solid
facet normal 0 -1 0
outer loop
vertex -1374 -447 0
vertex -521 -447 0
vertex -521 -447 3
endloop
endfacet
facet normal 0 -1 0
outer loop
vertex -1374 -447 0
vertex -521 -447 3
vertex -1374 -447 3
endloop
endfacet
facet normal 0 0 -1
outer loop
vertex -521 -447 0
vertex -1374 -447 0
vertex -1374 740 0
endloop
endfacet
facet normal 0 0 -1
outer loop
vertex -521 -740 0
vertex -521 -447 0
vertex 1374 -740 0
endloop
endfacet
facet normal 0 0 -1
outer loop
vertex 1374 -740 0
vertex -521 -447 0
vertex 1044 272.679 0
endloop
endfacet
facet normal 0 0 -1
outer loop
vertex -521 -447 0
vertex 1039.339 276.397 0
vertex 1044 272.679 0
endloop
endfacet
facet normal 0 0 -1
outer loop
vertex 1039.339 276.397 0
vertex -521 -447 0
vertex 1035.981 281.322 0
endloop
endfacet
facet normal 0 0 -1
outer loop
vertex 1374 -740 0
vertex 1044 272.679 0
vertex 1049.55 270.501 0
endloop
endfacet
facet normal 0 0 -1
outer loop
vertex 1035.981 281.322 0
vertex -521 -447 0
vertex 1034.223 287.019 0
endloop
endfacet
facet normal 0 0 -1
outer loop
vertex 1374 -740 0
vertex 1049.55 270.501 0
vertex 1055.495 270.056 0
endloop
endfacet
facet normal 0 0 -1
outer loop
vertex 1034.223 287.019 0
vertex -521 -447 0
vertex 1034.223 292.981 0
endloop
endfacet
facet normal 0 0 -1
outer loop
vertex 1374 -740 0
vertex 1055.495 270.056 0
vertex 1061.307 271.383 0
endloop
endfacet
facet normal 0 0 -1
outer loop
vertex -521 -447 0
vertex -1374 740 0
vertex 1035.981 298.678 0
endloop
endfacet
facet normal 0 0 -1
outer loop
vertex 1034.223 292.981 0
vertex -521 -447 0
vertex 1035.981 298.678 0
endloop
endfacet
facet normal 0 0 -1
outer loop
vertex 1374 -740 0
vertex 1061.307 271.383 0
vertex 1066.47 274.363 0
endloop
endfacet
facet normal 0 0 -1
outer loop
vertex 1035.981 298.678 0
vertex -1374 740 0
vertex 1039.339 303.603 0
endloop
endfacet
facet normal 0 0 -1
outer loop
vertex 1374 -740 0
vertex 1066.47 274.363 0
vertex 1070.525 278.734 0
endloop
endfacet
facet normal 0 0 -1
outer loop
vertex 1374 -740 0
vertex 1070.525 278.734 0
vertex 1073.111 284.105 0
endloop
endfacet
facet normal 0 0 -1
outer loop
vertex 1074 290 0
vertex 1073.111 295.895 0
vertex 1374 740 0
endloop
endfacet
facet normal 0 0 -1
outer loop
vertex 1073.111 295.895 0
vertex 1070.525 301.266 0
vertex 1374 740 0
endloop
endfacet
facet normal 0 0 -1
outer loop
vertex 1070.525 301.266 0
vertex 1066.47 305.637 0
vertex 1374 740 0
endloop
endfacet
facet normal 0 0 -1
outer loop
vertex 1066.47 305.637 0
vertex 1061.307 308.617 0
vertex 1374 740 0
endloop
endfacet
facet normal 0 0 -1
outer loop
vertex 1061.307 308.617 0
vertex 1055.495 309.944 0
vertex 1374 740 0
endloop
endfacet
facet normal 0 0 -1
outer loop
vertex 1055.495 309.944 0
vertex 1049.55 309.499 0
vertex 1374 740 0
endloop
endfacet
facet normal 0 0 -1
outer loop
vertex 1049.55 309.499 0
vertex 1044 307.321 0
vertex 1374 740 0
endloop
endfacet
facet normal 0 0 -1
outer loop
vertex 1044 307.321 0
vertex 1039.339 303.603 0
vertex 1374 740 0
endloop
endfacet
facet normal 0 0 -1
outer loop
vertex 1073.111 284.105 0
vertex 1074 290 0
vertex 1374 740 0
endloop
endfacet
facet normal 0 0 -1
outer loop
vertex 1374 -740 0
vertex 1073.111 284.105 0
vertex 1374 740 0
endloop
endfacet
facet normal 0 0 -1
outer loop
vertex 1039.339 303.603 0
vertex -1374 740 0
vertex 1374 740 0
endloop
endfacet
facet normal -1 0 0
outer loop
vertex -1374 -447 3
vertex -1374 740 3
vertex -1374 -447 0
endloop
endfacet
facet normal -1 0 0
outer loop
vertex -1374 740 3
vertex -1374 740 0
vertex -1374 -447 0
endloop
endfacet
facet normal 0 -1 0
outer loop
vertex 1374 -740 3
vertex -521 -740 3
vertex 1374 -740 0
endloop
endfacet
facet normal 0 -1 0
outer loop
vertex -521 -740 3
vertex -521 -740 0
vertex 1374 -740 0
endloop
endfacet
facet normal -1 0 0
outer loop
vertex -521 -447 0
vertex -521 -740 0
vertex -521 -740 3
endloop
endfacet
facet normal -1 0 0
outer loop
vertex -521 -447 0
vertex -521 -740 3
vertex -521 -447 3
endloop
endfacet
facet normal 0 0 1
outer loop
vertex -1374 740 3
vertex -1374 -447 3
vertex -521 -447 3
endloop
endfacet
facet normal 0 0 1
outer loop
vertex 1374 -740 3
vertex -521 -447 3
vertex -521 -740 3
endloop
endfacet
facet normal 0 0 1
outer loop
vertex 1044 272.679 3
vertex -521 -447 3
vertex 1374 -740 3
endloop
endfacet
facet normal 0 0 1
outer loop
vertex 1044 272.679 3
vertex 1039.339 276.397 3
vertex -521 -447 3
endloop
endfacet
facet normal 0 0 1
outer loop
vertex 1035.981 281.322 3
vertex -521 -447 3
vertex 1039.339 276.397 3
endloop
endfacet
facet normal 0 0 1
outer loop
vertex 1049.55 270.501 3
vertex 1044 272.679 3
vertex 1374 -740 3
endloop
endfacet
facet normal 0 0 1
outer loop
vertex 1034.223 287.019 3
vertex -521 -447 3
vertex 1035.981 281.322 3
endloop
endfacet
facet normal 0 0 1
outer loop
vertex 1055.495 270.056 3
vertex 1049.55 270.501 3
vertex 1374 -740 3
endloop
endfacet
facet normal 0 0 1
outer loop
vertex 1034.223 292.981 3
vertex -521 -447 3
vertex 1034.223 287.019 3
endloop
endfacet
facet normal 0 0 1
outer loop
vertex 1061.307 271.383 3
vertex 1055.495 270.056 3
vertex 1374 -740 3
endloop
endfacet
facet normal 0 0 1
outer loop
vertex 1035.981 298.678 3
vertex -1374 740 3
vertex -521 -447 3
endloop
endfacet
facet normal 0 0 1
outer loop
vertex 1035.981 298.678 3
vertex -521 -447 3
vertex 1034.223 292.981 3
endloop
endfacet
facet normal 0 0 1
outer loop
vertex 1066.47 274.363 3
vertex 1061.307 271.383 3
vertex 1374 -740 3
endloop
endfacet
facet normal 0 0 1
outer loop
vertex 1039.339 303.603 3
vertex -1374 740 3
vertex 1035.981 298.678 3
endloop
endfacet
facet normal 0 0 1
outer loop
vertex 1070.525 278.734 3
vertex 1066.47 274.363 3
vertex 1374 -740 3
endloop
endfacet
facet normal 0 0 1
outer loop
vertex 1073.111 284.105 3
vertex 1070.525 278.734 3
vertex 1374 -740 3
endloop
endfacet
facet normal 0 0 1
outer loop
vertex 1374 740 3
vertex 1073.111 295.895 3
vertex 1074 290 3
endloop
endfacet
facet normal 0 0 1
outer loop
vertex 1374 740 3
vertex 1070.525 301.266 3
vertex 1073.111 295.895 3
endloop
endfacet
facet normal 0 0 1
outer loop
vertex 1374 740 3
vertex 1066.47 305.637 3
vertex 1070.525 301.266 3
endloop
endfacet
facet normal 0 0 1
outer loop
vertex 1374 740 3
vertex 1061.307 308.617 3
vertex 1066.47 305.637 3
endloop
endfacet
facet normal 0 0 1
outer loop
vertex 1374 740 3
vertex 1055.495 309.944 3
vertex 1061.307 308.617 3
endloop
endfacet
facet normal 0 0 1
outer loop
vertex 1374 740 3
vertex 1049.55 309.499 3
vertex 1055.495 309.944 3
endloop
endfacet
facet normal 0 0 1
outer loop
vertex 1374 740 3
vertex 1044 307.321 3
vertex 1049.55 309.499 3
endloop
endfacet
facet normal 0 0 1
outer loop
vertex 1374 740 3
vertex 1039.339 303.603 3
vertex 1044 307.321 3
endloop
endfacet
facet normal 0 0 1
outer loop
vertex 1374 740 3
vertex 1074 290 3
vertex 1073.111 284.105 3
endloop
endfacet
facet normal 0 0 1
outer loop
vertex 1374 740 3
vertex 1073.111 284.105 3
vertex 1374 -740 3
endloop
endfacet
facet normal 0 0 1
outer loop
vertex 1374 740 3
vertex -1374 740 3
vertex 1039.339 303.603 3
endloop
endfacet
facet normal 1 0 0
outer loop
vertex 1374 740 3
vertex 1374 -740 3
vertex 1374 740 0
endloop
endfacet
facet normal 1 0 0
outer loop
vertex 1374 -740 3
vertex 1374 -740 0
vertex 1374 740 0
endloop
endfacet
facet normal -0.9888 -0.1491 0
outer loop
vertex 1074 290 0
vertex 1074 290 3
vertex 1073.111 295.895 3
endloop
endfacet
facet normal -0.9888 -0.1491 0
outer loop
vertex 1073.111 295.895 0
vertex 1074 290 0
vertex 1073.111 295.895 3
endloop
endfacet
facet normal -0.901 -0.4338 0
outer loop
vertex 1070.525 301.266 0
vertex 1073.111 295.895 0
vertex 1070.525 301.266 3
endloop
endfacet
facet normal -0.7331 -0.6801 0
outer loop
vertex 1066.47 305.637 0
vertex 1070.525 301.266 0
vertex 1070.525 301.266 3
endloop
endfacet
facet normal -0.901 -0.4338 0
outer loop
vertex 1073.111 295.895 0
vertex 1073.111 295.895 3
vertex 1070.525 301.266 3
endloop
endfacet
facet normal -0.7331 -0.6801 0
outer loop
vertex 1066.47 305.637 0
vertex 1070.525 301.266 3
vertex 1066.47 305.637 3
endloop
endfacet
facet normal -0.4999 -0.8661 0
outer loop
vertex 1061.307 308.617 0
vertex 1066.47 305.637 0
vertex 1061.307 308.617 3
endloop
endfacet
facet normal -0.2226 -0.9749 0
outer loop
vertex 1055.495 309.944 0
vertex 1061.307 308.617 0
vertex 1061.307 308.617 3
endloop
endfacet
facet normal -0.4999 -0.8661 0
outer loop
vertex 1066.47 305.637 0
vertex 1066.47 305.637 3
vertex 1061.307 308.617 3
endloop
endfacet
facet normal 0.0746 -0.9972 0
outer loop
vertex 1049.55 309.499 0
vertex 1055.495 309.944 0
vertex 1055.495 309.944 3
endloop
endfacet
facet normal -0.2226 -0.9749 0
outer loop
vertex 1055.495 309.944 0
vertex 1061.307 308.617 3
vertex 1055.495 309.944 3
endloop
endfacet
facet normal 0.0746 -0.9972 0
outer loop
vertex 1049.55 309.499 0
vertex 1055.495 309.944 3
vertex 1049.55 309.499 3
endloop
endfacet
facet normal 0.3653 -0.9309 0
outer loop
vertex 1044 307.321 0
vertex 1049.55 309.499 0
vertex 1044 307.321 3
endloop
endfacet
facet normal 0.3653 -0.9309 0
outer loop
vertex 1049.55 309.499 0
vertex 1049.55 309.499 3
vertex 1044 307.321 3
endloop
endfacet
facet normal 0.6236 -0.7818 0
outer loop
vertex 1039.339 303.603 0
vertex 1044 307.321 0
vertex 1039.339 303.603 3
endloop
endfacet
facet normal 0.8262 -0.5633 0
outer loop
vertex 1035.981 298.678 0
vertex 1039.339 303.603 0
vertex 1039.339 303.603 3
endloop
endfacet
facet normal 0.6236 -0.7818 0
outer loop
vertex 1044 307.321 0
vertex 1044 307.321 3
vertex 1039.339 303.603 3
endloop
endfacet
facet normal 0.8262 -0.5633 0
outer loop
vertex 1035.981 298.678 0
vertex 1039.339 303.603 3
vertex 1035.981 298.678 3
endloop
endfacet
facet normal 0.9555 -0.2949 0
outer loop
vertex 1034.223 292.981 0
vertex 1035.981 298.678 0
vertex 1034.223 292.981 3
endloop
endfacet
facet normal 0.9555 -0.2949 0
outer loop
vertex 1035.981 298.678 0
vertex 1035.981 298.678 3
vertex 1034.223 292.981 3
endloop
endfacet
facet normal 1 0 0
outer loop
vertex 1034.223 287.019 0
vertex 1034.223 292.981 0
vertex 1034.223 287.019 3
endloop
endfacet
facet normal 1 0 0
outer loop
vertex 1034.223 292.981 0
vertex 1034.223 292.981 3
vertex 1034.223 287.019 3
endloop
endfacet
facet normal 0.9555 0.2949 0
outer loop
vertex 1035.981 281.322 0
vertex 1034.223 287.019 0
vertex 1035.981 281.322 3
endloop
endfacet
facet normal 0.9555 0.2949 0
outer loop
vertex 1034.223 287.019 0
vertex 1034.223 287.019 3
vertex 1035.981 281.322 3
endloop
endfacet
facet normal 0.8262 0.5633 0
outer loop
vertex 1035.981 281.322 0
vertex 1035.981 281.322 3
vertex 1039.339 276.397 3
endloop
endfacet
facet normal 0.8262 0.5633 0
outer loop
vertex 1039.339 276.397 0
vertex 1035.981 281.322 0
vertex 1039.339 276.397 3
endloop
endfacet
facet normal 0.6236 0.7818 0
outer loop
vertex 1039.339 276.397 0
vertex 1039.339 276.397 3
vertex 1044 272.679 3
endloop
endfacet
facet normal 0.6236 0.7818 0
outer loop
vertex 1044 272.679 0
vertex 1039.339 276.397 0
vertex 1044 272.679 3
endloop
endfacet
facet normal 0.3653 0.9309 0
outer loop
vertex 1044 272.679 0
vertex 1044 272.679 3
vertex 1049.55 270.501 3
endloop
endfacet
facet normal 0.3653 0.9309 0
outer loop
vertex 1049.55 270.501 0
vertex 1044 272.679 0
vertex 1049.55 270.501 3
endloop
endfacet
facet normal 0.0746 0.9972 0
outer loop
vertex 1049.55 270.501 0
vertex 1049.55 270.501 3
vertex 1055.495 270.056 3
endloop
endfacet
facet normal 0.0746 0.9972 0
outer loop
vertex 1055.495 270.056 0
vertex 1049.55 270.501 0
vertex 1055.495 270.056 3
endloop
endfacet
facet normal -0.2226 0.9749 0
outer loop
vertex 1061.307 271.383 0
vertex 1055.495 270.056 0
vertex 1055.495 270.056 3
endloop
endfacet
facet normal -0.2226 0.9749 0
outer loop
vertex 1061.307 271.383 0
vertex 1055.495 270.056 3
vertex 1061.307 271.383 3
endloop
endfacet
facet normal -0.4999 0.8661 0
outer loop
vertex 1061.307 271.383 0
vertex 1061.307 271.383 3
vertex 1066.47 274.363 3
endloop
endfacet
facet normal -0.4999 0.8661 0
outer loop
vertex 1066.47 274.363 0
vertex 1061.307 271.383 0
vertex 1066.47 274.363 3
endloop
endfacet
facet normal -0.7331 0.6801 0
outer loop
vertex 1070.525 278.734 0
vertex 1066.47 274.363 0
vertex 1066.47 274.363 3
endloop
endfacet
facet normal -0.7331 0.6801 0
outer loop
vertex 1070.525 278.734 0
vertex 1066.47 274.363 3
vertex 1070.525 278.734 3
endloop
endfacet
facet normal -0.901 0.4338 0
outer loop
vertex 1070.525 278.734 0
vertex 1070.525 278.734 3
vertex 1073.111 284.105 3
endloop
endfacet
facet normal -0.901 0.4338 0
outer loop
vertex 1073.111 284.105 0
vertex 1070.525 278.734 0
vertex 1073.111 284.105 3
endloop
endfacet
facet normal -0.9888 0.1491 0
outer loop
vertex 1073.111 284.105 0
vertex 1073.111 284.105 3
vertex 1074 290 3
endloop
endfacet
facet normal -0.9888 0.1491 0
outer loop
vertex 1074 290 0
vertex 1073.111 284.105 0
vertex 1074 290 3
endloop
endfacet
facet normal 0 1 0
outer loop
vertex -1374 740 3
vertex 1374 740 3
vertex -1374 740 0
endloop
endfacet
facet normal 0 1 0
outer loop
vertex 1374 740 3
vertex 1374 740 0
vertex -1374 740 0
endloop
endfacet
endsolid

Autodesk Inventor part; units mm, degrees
ref_plane "YZ Plane" through (0, 0, 0) normal (1, 0, 0) x (0, 1, 0)
ref_plane "XZ Plane" through (0, 0, 0) normal (0, 1, 0) x (-1, 0, 0)
ref_plane "XY Plane" through (0, 0, 0) normal (0, 0, 1) x (1, 0, 0)
sketch "Sketch1" plane through (0, 0, 0) normal (0, 0, 1) x (1, 0, 0)
  line L0 (-1374, -740) -> (1374, -740)
  line L1 (1374, -740) -> (1374, 740)
  line L2 (1374, 740) -> (-1374, 740)
  line L3 (-1374, 740) -> (-1374, -740)
  line L4 (-1374, -740) -> (1374, 740) construction
  line L5 (1374, -740) -> (-1374, 740) construction
  line L6 (-1374, -740) -> (-521, -740)
  line L7 (-521, -740) -> (-521, -447)
  line L8 (-521, -447) -> (-1374, -447)
  line L9 (-1374, -447) -> (-1374, -740)
  point P0 (0, 0)
  point P1 (-1374, -593.5)
  point P2 (-521, -740)
  dimension "d0" = 2748
  dimension "d1" = 1480
  dimension "d30" = 293
  dimension "d31" = 853
extrude "Plate1" add sketch "Sketch1" along normal blind 3 contours L7 L8 L3 L2 L1 L0
sketch "Sketch5" plane through (0, 0, 3) normal (0, 0, 1) x (1, 0, 0)
  line L0 (1349, 715) -> (1349, 515) construction
  line L1 (1349, 515) -> (1334, 515) construction
  line L2 (1334, 515) -> (1334, 715) construction
  line L3 (1334, 715) -> (1349, 715) construction
  line L4 (1374, 740) -> (1374, -740) projected
  line L5 (-1374, 740) -> (1374, 740) projected
  point P0 (0, 0)
  dimension "d26" = 200
  dimension "d27" = 15
  dimension "d28" = 25
  dimension "d29" = 25
mark "Mark1"
sketch "Sketch6" plane through (-1374, 740, 3) normal (0, 0, 1) x (1, 0, 0)
  circle A0 centre (2428, -450) radius 20
  line L0 (2748, 0) -> (2748, -1480) projected
  line L1 (0, 0) -> (2748, 0) projected
  point P0 (1374, -740)
  dimension "d32" = 40
  dimension "d33" = 320
  dimension "d34" = 450
extrude "Extrusion2" cut sketch "Sketch6" against normal up to surface (3 mm away)
equation "\"d2\" = Thickness"
equation "\"BendReliefWidth\" = Thickness"
equation "\"BendReliefDepth\" = 0.5 * Thickness"
equation "\"CornerReliefSize\" = 4 * Thickness"
equation "\"MinimumRemnant\" = 2 * Thickness"
equation "\"TransitionRadius\" = BendRadius"
equation "\"JacobiRadiusSize\" = BendRadius"
equation "\"GapSize\" = Thickness"
equation "\"Thickness\" = 3"
equation "\"BendRadius\" = 5"
properties part number "BSH 044 board" material "09g2s"
